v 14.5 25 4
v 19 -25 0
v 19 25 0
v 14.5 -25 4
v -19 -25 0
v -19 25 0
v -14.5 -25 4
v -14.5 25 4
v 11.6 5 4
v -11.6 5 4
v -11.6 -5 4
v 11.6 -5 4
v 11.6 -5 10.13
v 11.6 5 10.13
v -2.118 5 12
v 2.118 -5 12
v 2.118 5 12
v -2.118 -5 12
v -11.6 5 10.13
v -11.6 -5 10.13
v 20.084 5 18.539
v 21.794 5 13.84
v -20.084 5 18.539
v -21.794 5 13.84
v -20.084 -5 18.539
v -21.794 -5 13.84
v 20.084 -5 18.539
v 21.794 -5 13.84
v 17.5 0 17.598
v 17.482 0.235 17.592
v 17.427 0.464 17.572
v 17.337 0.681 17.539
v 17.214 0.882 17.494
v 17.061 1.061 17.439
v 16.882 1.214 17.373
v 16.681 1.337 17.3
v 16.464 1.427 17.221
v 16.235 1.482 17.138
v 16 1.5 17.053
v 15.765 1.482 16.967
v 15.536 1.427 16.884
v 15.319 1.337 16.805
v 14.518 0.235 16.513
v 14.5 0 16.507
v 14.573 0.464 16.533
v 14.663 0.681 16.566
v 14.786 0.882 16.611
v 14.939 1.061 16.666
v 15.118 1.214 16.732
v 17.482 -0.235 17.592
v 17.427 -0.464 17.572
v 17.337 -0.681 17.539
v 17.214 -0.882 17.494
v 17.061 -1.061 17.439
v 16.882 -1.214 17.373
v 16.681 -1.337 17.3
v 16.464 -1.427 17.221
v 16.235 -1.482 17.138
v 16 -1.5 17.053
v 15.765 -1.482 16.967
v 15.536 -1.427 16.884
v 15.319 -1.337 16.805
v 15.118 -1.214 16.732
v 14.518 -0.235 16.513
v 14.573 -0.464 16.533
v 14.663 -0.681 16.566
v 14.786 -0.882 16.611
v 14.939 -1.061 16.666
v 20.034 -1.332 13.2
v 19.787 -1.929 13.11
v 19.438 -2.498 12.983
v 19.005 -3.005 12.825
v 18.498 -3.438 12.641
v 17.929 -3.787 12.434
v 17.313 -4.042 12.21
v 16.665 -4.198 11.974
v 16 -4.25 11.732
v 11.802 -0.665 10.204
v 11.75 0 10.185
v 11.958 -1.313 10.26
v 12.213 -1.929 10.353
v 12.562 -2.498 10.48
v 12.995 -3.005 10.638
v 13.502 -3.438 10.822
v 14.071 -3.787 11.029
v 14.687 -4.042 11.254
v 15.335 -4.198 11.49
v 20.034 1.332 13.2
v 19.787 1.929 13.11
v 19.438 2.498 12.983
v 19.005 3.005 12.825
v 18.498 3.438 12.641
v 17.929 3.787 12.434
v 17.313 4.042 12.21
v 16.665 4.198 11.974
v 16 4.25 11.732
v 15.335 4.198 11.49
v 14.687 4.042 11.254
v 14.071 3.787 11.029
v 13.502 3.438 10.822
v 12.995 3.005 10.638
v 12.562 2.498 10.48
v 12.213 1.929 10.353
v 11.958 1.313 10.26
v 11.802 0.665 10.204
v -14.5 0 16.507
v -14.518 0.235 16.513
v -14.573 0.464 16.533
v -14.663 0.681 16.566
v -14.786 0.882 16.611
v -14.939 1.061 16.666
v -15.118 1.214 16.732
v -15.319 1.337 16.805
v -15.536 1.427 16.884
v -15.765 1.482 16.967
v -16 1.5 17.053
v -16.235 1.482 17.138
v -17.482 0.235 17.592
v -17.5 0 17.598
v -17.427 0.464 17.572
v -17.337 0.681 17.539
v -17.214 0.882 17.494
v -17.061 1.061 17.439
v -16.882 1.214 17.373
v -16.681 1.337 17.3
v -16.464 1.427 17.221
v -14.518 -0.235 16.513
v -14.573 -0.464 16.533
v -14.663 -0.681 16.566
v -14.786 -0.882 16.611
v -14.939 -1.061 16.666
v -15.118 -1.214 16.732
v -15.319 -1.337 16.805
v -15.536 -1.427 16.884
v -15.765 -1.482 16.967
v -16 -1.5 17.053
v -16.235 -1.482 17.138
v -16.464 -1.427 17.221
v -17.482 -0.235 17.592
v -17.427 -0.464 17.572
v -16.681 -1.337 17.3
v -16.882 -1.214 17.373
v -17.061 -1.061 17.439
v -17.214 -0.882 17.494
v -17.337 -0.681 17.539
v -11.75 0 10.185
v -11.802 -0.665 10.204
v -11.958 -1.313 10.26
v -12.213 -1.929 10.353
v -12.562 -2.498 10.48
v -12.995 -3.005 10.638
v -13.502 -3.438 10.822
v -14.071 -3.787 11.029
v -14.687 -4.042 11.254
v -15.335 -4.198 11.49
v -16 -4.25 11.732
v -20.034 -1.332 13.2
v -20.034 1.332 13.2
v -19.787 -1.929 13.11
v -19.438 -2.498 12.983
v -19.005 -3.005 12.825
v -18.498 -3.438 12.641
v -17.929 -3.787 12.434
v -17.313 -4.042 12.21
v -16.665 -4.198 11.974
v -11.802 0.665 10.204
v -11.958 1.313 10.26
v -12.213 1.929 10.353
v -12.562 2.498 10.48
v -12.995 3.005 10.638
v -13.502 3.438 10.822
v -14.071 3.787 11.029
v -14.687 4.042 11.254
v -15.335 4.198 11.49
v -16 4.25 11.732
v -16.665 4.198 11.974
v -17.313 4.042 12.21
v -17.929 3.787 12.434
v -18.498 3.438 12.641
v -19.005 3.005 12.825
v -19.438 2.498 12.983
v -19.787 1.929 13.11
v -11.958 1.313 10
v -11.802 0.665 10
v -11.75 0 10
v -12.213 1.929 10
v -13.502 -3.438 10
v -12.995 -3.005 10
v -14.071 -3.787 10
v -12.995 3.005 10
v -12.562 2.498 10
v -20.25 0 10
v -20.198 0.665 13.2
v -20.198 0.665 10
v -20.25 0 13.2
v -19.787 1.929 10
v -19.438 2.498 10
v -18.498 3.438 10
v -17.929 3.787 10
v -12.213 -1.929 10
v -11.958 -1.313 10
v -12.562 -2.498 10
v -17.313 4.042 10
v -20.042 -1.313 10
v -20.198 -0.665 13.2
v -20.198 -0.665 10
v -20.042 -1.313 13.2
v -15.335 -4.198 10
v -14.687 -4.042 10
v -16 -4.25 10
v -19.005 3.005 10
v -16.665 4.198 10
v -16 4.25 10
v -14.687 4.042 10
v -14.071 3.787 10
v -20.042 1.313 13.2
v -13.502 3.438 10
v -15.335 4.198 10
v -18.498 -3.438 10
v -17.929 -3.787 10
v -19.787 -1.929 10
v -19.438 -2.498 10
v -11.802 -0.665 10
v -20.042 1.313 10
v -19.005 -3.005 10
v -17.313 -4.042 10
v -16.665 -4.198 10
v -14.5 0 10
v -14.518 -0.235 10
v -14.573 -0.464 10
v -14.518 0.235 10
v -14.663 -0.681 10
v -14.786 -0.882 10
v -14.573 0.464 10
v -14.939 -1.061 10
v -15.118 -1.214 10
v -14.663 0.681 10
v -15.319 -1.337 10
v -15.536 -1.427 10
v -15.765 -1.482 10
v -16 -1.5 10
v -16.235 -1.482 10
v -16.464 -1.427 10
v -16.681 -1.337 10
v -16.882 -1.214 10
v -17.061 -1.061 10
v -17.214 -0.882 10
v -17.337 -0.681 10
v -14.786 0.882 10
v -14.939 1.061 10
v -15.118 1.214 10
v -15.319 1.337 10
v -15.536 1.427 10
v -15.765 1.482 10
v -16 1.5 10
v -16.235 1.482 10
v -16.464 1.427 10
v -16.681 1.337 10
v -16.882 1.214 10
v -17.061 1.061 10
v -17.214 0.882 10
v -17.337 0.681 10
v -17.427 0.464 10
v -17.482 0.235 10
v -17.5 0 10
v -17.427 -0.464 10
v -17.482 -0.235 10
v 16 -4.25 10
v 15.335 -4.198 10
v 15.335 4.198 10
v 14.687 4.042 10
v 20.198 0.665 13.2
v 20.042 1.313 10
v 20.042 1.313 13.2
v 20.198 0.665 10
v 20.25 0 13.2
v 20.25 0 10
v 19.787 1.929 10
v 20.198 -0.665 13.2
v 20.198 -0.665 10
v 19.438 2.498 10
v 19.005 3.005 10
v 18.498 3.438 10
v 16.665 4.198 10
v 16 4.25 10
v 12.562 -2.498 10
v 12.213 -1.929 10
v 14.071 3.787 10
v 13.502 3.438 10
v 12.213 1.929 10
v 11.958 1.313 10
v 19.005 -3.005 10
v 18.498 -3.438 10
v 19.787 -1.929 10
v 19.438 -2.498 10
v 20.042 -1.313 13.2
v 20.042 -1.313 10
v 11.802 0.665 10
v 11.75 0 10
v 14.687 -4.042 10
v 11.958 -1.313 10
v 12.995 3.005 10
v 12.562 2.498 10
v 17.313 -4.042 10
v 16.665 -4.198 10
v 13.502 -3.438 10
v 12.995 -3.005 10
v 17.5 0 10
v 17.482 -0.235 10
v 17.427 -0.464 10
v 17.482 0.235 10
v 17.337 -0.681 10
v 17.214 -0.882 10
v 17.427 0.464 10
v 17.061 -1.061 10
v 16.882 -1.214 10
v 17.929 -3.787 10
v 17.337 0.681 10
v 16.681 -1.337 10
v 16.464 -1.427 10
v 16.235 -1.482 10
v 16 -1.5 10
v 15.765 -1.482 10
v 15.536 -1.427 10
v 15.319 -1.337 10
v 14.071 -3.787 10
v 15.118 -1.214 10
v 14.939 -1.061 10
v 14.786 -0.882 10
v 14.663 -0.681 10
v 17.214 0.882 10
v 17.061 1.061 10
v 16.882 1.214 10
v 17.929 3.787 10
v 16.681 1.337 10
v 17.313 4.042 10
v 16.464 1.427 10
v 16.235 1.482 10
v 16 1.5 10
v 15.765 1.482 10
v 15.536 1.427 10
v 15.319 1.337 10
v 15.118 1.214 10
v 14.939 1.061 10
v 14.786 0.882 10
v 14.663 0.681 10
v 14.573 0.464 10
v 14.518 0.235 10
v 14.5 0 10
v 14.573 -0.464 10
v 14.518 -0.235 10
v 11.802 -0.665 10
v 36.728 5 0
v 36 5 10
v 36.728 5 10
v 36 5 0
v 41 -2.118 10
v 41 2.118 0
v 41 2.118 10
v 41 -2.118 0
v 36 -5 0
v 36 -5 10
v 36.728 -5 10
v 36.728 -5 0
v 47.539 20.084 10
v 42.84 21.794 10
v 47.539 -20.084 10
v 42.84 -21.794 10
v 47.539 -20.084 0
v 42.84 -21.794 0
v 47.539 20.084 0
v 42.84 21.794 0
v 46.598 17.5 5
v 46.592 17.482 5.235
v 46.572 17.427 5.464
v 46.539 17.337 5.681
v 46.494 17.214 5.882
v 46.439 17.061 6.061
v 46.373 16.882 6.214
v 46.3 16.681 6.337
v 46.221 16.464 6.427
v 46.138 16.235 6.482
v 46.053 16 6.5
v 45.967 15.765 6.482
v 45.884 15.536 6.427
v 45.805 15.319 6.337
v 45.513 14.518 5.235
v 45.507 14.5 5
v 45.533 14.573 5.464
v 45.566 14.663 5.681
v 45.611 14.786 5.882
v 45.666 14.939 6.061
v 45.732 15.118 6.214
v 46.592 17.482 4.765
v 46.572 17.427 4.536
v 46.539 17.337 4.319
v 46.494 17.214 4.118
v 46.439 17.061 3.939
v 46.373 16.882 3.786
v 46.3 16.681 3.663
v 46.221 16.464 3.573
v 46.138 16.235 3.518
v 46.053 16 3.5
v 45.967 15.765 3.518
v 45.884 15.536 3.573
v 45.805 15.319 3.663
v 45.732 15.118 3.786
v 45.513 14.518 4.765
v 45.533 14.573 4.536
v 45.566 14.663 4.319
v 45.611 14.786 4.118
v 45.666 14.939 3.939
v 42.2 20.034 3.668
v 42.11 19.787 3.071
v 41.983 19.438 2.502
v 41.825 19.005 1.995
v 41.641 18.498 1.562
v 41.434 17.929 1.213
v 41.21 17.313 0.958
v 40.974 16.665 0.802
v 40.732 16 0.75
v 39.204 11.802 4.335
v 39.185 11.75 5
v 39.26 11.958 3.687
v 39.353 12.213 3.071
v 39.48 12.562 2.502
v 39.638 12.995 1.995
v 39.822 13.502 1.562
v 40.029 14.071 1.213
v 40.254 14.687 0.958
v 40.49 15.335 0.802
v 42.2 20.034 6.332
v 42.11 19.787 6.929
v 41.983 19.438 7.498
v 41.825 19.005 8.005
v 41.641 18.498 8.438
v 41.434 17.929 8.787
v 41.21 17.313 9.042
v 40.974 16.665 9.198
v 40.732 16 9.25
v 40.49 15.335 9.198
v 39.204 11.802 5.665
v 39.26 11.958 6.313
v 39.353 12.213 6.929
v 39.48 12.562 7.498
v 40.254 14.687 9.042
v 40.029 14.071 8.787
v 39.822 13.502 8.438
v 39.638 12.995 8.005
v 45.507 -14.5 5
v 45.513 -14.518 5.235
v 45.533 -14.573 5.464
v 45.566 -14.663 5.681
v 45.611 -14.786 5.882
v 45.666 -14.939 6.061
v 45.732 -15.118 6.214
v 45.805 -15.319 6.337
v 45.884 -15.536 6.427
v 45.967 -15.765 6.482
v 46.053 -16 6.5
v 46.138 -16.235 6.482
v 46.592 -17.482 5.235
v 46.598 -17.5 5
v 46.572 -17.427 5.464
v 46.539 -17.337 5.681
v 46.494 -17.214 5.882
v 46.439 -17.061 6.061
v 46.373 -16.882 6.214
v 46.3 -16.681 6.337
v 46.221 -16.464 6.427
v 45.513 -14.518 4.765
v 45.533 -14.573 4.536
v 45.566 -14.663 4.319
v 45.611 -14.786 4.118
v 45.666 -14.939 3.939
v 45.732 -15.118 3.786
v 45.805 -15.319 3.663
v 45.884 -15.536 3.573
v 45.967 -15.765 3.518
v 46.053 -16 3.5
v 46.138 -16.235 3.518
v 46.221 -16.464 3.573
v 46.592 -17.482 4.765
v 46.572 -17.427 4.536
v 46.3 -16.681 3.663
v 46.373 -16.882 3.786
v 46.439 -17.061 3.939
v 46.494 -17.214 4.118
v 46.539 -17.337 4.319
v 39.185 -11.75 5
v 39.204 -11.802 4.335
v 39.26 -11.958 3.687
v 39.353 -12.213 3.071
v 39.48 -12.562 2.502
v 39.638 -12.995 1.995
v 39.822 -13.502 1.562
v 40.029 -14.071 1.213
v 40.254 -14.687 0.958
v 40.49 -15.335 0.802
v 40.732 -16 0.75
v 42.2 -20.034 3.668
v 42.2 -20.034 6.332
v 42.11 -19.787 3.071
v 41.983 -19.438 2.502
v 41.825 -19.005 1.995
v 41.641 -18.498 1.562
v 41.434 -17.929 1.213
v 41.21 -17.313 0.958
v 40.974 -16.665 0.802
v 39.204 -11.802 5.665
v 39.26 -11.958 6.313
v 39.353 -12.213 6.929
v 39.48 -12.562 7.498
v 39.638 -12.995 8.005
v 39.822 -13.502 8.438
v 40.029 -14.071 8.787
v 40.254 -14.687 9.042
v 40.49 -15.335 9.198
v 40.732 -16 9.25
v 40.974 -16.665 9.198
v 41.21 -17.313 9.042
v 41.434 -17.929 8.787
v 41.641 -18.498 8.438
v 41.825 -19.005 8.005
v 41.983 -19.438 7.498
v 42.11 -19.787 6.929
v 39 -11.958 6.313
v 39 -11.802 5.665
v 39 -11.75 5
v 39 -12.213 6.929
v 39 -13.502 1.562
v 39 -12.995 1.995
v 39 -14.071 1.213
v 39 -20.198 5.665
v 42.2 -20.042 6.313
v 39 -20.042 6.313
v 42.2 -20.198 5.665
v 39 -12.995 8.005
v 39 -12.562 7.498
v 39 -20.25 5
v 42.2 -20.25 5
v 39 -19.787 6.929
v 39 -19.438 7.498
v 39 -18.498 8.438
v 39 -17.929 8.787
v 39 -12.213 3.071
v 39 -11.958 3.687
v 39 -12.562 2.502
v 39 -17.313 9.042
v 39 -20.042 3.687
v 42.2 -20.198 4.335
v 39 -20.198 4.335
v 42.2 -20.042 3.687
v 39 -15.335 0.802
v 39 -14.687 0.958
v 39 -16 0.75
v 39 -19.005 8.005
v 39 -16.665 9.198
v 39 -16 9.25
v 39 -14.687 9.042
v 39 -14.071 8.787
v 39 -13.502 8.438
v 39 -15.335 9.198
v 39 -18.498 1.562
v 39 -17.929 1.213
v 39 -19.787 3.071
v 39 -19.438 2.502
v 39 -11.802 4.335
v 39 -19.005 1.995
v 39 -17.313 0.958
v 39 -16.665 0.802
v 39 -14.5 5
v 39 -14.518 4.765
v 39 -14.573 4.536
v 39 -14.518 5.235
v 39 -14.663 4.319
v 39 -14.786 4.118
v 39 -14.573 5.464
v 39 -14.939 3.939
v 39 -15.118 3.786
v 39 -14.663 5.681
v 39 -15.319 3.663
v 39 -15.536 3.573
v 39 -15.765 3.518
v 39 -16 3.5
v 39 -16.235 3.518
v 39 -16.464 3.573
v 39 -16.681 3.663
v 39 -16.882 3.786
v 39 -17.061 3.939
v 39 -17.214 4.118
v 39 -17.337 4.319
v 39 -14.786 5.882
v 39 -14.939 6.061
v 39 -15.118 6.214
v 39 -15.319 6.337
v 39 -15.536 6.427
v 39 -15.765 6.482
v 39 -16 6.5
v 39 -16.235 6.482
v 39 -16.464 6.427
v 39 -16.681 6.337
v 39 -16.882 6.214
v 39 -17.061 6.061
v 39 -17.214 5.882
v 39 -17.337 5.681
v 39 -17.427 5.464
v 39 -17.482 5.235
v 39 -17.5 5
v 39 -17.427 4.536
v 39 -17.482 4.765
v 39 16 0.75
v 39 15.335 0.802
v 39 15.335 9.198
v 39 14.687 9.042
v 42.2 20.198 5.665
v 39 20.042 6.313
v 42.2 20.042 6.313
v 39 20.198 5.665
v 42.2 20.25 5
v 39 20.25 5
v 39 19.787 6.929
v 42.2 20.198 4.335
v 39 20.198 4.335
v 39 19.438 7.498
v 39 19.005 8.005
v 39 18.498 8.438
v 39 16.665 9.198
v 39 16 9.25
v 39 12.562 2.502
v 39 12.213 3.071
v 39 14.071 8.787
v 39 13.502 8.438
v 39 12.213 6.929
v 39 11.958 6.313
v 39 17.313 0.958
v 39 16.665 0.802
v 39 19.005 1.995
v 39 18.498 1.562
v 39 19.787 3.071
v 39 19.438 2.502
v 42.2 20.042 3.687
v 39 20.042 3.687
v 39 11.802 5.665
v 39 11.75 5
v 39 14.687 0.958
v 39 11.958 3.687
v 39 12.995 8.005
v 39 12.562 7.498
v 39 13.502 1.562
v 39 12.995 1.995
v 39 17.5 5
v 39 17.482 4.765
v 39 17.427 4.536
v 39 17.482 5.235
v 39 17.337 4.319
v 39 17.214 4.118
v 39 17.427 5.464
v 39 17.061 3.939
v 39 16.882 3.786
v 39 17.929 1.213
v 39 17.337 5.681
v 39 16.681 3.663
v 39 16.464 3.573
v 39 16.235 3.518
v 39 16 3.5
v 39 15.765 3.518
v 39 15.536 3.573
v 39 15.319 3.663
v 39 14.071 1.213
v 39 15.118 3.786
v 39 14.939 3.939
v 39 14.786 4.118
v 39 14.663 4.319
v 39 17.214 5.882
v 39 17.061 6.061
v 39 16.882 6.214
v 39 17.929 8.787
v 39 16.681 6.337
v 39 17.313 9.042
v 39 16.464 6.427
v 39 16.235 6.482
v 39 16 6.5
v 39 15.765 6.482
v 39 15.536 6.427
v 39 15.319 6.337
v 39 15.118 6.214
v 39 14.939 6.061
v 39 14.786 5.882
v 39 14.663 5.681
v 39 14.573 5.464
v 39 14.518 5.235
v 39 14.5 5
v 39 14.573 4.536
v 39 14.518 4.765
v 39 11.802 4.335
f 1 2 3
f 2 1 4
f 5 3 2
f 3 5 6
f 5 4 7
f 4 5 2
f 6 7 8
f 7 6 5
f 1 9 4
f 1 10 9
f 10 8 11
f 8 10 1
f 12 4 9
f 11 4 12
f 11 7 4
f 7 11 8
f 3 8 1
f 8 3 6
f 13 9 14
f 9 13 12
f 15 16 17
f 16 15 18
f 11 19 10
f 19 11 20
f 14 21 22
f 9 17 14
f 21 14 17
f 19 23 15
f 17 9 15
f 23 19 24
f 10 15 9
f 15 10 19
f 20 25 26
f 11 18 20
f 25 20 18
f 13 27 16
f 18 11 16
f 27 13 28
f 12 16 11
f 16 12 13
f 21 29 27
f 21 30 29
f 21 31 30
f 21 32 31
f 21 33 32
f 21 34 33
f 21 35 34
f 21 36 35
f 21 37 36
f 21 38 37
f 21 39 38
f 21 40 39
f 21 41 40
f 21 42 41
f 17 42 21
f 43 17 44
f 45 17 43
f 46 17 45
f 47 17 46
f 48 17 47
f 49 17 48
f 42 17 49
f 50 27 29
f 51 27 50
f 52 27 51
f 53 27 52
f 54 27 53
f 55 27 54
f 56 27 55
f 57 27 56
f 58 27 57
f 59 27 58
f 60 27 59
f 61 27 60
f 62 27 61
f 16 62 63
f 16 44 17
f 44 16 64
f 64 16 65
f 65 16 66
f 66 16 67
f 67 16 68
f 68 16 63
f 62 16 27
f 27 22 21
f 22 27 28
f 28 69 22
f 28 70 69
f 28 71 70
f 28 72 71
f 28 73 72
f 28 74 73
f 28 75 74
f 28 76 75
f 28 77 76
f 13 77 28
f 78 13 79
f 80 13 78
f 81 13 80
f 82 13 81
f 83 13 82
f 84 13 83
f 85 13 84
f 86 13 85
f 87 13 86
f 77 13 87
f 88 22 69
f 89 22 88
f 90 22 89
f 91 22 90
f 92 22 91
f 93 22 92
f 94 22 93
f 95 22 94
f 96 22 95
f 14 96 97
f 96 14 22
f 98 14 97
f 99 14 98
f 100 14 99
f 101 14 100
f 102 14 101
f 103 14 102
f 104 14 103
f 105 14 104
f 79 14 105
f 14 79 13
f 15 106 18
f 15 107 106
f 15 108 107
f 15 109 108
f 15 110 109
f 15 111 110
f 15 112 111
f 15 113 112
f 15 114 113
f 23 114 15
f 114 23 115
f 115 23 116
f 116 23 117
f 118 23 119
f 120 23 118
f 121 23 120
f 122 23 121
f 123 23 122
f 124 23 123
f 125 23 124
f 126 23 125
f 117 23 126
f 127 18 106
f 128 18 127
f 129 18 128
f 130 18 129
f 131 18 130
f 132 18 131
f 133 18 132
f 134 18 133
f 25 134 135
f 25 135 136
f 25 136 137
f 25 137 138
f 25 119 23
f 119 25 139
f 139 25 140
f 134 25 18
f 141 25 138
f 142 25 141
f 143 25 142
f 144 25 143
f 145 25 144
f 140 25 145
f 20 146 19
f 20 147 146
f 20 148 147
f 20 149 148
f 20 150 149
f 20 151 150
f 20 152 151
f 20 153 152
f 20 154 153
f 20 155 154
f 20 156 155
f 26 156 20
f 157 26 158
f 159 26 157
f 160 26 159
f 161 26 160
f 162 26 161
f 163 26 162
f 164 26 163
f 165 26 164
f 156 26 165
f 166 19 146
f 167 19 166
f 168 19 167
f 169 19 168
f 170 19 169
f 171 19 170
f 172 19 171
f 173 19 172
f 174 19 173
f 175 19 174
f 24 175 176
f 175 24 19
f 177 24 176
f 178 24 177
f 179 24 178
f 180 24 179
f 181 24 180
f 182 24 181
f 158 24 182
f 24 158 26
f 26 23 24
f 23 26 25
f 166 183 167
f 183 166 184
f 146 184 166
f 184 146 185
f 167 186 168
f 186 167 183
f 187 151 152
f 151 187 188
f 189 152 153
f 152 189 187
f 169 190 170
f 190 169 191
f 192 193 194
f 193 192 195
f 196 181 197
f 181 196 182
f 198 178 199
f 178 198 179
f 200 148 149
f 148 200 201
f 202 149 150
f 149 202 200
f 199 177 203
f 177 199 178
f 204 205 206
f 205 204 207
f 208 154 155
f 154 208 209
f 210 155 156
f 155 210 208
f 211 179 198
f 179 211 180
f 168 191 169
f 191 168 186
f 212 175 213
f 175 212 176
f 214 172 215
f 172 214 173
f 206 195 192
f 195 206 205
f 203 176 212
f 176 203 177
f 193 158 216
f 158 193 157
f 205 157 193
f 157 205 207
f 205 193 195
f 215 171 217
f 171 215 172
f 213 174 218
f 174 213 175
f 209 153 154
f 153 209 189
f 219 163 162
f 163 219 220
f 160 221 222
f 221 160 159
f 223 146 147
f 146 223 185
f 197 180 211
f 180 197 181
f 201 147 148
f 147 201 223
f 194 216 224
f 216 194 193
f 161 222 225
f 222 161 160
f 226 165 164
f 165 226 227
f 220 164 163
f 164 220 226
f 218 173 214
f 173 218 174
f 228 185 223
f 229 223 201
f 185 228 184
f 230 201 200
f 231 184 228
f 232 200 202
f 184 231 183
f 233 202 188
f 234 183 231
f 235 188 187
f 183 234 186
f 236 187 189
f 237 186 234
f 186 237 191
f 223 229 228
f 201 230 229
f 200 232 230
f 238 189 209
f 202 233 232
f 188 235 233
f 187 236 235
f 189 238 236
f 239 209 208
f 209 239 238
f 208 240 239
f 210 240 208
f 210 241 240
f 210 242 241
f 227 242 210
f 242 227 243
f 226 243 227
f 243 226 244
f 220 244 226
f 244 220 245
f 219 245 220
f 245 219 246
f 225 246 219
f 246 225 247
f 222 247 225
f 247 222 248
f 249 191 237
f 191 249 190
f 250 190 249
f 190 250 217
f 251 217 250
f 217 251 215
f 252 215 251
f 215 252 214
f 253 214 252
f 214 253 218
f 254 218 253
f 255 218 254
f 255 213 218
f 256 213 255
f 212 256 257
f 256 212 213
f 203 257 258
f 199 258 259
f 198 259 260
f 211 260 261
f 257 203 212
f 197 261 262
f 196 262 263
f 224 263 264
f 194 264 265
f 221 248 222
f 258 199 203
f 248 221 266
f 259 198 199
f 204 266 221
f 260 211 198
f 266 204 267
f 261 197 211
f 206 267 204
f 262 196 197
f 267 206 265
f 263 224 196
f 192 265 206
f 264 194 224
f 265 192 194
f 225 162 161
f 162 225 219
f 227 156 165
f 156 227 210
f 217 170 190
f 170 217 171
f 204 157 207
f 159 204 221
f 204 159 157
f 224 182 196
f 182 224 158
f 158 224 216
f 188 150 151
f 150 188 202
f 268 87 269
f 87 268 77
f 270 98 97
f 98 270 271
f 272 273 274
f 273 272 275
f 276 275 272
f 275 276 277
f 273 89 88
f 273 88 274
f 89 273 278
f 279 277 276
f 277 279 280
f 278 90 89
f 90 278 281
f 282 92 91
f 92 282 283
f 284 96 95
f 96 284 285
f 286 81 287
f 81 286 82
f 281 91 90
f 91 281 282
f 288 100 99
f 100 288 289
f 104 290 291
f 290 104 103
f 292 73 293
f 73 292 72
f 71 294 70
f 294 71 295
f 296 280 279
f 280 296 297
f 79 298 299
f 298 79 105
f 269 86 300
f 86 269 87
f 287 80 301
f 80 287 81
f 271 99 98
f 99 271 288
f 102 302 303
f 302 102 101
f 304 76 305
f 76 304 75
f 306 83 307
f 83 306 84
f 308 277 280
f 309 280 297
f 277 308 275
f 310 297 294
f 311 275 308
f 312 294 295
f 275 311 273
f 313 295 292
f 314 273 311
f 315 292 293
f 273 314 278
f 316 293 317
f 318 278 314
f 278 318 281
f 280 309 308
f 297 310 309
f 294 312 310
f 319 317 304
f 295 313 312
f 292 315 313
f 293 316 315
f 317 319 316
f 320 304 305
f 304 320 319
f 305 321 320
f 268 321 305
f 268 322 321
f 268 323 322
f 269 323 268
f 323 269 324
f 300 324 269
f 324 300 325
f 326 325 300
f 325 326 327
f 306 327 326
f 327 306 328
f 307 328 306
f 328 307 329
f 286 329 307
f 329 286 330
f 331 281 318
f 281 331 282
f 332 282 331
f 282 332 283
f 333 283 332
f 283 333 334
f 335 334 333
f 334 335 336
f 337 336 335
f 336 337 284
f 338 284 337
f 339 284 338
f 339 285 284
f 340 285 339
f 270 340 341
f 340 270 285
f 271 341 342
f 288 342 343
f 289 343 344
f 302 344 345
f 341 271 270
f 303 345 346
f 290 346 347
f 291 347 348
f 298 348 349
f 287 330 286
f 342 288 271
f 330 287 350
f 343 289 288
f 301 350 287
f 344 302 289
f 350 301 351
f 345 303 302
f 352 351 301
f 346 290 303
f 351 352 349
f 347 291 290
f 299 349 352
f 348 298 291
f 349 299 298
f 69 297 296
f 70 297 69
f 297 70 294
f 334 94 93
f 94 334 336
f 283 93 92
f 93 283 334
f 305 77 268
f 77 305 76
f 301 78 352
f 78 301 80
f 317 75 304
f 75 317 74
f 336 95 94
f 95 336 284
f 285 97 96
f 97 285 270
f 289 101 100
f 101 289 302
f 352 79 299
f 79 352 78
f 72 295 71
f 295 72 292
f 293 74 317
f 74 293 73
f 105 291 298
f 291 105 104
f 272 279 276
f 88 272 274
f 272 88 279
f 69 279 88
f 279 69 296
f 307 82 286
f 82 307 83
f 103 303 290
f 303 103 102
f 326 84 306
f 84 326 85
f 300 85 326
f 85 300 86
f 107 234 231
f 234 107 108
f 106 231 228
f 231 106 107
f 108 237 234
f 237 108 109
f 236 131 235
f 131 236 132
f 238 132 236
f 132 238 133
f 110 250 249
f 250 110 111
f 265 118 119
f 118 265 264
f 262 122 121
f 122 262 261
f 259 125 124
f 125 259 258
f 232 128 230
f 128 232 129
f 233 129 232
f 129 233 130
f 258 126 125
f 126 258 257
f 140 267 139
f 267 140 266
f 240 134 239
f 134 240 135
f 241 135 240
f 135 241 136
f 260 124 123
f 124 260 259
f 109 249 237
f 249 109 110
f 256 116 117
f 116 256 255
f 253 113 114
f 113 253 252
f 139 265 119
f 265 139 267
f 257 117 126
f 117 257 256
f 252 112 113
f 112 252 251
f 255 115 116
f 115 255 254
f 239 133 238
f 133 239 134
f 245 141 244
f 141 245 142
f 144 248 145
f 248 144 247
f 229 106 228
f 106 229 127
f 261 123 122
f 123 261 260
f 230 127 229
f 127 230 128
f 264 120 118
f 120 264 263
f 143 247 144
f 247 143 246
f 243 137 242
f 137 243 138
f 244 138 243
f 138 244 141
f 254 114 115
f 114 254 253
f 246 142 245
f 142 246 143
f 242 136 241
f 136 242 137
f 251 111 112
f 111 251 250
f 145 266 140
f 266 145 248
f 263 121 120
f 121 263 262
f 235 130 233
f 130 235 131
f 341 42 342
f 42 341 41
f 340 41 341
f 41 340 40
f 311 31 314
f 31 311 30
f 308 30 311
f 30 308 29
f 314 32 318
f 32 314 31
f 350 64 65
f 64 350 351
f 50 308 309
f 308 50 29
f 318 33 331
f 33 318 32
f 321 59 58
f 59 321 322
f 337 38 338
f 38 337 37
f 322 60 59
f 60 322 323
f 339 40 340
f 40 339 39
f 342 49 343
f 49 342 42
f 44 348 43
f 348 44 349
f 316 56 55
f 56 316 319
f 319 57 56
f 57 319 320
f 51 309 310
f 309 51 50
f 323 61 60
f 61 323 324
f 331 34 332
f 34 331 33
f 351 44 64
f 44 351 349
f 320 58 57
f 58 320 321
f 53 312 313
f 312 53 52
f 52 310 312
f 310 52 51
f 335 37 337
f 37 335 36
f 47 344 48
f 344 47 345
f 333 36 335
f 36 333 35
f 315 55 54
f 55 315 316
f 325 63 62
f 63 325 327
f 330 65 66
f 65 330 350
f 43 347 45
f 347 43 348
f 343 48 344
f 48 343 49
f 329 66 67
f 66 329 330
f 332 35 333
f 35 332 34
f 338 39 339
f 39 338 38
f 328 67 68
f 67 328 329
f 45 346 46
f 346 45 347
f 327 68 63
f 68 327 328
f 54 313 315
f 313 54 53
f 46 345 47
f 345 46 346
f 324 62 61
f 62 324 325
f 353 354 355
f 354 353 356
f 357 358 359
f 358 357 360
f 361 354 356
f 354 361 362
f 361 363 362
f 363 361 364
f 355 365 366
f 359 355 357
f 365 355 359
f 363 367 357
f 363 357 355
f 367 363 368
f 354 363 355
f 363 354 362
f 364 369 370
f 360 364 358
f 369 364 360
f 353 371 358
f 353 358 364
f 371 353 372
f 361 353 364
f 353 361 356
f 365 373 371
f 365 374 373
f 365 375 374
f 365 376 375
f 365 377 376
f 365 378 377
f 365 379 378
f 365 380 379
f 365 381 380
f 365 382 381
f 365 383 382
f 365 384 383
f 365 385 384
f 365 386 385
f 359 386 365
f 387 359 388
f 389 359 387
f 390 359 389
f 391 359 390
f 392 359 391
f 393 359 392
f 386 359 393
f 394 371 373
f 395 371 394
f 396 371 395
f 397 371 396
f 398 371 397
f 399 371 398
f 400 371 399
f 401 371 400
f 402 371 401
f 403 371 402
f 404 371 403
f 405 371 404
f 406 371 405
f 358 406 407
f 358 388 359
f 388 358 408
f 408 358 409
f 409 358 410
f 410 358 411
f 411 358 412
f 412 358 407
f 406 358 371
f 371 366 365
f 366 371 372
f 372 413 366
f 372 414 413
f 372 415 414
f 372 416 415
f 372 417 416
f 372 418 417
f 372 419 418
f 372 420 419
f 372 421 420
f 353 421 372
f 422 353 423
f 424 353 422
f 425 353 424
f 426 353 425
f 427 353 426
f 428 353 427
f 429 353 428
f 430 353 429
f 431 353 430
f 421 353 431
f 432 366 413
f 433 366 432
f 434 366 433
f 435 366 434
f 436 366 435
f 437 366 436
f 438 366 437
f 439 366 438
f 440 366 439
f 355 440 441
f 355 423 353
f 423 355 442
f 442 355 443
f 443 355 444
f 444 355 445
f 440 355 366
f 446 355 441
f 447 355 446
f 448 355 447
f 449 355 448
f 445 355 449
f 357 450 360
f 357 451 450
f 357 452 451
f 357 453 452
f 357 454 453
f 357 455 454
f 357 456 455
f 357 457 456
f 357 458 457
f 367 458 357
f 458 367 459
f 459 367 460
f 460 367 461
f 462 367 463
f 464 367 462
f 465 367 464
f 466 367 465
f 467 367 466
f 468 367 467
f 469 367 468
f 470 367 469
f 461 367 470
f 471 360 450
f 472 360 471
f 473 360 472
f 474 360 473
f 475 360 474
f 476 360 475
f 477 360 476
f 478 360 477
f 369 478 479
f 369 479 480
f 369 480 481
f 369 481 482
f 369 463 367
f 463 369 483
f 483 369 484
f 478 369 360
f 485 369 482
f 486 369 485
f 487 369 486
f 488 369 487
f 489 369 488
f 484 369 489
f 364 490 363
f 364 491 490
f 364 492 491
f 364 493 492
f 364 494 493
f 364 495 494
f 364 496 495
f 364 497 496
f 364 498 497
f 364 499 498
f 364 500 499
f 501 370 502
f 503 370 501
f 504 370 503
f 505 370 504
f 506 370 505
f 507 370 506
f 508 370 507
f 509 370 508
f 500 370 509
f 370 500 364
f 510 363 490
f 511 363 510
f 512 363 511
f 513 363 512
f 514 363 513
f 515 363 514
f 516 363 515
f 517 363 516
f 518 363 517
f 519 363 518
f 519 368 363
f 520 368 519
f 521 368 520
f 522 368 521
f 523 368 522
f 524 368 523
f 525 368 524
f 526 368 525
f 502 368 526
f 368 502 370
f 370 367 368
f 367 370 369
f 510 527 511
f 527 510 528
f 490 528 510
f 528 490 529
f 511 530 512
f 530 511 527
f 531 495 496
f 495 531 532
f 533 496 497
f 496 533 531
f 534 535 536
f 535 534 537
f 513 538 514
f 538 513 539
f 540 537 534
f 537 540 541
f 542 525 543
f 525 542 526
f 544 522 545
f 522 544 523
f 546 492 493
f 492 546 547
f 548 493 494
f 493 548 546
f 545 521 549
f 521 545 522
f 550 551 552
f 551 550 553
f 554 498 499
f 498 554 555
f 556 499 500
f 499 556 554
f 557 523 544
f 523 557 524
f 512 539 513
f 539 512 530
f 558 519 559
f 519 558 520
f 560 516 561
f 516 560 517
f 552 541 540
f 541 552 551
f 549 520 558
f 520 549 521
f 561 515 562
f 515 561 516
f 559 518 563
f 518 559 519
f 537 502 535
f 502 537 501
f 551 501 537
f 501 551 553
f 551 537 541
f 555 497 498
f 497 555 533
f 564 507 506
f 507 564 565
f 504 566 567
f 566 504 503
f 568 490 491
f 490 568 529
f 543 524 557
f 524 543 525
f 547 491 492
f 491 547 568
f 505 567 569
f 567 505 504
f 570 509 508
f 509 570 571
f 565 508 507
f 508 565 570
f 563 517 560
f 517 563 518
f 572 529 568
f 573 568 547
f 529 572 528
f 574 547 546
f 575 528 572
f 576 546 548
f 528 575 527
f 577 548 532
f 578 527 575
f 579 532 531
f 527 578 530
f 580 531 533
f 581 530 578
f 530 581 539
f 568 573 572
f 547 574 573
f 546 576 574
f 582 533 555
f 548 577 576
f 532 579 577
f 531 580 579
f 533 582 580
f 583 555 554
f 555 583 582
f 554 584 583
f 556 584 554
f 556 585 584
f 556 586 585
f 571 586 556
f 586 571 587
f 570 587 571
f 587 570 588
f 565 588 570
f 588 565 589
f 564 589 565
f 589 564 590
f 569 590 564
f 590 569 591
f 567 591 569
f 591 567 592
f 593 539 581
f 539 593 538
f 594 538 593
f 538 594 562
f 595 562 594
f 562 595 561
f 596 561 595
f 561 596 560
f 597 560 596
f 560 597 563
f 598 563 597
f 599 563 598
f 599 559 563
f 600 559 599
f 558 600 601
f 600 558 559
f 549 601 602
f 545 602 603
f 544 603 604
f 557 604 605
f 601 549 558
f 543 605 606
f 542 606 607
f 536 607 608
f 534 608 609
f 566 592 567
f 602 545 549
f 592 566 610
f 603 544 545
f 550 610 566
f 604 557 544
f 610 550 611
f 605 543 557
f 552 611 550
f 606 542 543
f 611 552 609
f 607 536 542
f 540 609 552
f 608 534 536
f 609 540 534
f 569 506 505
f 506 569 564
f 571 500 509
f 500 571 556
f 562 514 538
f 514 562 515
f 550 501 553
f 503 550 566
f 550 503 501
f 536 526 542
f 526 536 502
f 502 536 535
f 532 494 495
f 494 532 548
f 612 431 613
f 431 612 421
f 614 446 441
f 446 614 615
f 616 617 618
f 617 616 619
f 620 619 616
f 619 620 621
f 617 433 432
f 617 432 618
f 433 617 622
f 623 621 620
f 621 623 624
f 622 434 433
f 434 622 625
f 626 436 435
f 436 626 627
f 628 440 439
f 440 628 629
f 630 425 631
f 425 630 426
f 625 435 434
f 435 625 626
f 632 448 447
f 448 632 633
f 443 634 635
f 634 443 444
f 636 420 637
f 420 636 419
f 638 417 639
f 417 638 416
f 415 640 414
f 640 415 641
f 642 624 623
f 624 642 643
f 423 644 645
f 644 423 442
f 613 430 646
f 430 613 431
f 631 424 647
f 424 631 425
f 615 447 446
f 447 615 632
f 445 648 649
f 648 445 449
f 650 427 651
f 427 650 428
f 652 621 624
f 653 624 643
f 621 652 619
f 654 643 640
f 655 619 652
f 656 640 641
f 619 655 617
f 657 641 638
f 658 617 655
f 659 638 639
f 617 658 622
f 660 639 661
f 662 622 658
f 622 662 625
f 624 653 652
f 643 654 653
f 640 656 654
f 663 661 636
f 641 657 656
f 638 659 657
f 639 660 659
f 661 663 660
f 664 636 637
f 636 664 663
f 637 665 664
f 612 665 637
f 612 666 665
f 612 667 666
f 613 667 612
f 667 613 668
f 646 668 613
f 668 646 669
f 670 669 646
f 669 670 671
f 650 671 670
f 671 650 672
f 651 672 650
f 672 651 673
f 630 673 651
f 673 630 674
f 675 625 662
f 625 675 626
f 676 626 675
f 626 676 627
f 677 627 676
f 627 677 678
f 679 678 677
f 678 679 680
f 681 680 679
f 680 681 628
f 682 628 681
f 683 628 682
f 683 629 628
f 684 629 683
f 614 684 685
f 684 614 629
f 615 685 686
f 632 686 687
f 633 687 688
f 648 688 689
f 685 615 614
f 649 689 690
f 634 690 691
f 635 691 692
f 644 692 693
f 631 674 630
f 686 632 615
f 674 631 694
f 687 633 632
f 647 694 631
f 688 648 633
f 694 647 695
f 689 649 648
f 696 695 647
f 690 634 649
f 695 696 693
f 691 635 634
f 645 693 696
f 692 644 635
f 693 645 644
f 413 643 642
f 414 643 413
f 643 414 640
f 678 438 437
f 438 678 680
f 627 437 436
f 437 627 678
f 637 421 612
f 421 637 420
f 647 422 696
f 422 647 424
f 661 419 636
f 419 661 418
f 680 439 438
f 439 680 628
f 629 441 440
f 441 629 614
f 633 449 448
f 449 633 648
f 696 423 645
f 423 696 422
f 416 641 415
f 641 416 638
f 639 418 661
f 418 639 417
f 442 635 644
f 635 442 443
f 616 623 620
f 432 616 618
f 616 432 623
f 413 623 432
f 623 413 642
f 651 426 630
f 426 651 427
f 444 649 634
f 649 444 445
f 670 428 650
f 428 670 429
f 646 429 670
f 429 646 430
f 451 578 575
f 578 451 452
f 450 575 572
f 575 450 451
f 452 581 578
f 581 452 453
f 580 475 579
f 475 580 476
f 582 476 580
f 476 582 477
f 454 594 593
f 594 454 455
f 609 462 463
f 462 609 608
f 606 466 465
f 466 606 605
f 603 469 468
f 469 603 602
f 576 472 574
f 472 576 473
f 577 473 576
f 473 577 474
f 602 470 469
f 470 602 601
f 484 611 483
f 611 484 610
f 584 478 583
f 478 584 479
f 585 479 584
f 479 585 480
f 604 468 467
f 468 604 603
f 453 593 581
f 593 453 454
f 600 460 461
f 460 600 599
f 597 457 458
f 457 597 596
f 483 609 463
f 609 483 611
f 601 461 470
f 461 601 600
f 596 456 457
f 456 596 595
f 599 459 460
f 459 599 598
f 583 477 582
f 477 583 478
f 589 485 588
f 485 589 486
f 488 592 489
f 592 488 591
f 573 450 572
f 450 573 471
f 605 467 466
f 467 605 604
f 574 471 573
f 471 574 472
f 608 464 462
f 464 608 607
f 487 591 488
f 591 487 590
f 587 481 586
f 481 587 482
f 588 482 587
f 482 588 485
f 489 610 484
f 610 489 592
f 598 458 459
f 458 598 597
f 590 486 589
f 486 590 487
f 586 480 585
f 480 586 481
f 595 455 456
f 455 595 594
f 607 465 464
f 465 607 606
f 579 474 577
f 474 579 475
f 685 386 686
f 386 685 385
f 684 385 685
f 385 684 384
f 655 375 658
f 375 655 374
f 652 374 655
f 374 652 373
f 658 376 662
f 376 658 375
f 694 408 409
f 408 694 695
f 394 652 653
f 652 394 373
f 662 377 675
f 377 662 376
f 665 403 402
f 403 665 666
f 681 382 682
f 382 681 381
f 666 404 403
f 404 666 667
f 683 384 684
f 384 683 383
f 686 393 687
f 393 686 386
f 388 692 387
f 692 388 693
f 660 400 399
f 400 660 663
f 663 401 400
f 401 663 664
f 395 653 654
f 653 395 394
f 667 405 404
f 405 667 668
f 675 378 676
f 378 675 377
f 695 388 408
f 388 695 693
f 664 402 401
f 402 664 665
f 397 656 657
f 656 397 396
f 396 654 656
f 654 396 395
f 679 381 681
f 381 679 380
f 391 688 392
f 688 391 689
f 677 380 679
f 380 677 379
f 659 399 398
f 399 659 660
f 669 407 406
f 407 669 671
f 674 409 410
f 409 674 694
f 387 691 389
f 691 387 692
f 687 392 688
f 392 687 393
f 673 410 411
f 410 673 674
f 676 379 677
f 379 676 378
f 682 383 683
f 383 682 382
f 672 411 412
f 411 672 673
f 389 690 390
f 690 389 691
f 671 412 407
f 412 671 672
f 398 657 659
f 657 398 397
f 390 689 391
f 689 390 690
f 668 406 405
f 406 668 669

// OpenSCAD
h = 4; //Height
wlow = 38; //Bottom width
whigh = 29; // Top width
depth = 50;
difference() {
    union() {
        rotate([90,0,0])linear_extrude(height=depth,center=true,convexity=10,twist=0)
        {
            polygon(points = [[-wlow/2,0],[-whigh/2,h],[whigh/2,h],[wlow/2,0]]);
            
        }
        translate([0,0,7])cube([min(whigh*0.8,25),10,10],center=true);
        translate([3,-5,7])rotate([0,-20,0])cube([20,10,5]);
        rotate([0,0,180])translate([3,-5,7])rotate([0,-20,0])cube([20,10,5]);
        translate([-16,0,10])cylinder(d=8.5,$fn=40,h=3.2);
        translate([16,0,10])cylinder(d=8.5,$fn=40,h=3.2);
    }
    translate([-16,0,9])cylinder(d=3,$fn=40,h=20);
    translate([16,0,9])cylinder(d=3,$fn=40,h=20);
    
    hd = 6;
    
   /* translate([-16,0,10])rotate([0,0,360/12])cylinder(d=hd,$fn=6,h=2.5);
    translate([16,0,10])cylinder(d=hd,$fn=6,h=2.5);*/
}

translate([wlow/2+10,0,5])rotate([90,0,90])difference() {
    union(){
        
        translate([0,0,9.5])cube([10,10,5],center=true);
        translate([3,-5,7])rotate([0,-20,0])cube([20,10,5]);
        rotate([0,0,180])translate([3,-5,7])rotate([0,-20,0])cube([20,10,5]);
        translate([-16,0,10])cylinder(d=8.5,$fn=40,h=3.2);
        translate([16,0,10])cylinder(d=8.5,$fn=40,h=3.2);
    }
    translate([-16,0,8.7])cylinder(d=3,$fn=40,h=20);
    translate([16,0,8.7])cylinder(d=3,$fn=40,h=20);
    
    hd = 6;
    
    //translate([-12,0,8.7])rotate([0,0,360/12])cylinder(d=hd,$fn=6,h=2.5);
    //translate([12,0,8.7])cylinder(d=hd,$fn=6,h=2.5);
}
